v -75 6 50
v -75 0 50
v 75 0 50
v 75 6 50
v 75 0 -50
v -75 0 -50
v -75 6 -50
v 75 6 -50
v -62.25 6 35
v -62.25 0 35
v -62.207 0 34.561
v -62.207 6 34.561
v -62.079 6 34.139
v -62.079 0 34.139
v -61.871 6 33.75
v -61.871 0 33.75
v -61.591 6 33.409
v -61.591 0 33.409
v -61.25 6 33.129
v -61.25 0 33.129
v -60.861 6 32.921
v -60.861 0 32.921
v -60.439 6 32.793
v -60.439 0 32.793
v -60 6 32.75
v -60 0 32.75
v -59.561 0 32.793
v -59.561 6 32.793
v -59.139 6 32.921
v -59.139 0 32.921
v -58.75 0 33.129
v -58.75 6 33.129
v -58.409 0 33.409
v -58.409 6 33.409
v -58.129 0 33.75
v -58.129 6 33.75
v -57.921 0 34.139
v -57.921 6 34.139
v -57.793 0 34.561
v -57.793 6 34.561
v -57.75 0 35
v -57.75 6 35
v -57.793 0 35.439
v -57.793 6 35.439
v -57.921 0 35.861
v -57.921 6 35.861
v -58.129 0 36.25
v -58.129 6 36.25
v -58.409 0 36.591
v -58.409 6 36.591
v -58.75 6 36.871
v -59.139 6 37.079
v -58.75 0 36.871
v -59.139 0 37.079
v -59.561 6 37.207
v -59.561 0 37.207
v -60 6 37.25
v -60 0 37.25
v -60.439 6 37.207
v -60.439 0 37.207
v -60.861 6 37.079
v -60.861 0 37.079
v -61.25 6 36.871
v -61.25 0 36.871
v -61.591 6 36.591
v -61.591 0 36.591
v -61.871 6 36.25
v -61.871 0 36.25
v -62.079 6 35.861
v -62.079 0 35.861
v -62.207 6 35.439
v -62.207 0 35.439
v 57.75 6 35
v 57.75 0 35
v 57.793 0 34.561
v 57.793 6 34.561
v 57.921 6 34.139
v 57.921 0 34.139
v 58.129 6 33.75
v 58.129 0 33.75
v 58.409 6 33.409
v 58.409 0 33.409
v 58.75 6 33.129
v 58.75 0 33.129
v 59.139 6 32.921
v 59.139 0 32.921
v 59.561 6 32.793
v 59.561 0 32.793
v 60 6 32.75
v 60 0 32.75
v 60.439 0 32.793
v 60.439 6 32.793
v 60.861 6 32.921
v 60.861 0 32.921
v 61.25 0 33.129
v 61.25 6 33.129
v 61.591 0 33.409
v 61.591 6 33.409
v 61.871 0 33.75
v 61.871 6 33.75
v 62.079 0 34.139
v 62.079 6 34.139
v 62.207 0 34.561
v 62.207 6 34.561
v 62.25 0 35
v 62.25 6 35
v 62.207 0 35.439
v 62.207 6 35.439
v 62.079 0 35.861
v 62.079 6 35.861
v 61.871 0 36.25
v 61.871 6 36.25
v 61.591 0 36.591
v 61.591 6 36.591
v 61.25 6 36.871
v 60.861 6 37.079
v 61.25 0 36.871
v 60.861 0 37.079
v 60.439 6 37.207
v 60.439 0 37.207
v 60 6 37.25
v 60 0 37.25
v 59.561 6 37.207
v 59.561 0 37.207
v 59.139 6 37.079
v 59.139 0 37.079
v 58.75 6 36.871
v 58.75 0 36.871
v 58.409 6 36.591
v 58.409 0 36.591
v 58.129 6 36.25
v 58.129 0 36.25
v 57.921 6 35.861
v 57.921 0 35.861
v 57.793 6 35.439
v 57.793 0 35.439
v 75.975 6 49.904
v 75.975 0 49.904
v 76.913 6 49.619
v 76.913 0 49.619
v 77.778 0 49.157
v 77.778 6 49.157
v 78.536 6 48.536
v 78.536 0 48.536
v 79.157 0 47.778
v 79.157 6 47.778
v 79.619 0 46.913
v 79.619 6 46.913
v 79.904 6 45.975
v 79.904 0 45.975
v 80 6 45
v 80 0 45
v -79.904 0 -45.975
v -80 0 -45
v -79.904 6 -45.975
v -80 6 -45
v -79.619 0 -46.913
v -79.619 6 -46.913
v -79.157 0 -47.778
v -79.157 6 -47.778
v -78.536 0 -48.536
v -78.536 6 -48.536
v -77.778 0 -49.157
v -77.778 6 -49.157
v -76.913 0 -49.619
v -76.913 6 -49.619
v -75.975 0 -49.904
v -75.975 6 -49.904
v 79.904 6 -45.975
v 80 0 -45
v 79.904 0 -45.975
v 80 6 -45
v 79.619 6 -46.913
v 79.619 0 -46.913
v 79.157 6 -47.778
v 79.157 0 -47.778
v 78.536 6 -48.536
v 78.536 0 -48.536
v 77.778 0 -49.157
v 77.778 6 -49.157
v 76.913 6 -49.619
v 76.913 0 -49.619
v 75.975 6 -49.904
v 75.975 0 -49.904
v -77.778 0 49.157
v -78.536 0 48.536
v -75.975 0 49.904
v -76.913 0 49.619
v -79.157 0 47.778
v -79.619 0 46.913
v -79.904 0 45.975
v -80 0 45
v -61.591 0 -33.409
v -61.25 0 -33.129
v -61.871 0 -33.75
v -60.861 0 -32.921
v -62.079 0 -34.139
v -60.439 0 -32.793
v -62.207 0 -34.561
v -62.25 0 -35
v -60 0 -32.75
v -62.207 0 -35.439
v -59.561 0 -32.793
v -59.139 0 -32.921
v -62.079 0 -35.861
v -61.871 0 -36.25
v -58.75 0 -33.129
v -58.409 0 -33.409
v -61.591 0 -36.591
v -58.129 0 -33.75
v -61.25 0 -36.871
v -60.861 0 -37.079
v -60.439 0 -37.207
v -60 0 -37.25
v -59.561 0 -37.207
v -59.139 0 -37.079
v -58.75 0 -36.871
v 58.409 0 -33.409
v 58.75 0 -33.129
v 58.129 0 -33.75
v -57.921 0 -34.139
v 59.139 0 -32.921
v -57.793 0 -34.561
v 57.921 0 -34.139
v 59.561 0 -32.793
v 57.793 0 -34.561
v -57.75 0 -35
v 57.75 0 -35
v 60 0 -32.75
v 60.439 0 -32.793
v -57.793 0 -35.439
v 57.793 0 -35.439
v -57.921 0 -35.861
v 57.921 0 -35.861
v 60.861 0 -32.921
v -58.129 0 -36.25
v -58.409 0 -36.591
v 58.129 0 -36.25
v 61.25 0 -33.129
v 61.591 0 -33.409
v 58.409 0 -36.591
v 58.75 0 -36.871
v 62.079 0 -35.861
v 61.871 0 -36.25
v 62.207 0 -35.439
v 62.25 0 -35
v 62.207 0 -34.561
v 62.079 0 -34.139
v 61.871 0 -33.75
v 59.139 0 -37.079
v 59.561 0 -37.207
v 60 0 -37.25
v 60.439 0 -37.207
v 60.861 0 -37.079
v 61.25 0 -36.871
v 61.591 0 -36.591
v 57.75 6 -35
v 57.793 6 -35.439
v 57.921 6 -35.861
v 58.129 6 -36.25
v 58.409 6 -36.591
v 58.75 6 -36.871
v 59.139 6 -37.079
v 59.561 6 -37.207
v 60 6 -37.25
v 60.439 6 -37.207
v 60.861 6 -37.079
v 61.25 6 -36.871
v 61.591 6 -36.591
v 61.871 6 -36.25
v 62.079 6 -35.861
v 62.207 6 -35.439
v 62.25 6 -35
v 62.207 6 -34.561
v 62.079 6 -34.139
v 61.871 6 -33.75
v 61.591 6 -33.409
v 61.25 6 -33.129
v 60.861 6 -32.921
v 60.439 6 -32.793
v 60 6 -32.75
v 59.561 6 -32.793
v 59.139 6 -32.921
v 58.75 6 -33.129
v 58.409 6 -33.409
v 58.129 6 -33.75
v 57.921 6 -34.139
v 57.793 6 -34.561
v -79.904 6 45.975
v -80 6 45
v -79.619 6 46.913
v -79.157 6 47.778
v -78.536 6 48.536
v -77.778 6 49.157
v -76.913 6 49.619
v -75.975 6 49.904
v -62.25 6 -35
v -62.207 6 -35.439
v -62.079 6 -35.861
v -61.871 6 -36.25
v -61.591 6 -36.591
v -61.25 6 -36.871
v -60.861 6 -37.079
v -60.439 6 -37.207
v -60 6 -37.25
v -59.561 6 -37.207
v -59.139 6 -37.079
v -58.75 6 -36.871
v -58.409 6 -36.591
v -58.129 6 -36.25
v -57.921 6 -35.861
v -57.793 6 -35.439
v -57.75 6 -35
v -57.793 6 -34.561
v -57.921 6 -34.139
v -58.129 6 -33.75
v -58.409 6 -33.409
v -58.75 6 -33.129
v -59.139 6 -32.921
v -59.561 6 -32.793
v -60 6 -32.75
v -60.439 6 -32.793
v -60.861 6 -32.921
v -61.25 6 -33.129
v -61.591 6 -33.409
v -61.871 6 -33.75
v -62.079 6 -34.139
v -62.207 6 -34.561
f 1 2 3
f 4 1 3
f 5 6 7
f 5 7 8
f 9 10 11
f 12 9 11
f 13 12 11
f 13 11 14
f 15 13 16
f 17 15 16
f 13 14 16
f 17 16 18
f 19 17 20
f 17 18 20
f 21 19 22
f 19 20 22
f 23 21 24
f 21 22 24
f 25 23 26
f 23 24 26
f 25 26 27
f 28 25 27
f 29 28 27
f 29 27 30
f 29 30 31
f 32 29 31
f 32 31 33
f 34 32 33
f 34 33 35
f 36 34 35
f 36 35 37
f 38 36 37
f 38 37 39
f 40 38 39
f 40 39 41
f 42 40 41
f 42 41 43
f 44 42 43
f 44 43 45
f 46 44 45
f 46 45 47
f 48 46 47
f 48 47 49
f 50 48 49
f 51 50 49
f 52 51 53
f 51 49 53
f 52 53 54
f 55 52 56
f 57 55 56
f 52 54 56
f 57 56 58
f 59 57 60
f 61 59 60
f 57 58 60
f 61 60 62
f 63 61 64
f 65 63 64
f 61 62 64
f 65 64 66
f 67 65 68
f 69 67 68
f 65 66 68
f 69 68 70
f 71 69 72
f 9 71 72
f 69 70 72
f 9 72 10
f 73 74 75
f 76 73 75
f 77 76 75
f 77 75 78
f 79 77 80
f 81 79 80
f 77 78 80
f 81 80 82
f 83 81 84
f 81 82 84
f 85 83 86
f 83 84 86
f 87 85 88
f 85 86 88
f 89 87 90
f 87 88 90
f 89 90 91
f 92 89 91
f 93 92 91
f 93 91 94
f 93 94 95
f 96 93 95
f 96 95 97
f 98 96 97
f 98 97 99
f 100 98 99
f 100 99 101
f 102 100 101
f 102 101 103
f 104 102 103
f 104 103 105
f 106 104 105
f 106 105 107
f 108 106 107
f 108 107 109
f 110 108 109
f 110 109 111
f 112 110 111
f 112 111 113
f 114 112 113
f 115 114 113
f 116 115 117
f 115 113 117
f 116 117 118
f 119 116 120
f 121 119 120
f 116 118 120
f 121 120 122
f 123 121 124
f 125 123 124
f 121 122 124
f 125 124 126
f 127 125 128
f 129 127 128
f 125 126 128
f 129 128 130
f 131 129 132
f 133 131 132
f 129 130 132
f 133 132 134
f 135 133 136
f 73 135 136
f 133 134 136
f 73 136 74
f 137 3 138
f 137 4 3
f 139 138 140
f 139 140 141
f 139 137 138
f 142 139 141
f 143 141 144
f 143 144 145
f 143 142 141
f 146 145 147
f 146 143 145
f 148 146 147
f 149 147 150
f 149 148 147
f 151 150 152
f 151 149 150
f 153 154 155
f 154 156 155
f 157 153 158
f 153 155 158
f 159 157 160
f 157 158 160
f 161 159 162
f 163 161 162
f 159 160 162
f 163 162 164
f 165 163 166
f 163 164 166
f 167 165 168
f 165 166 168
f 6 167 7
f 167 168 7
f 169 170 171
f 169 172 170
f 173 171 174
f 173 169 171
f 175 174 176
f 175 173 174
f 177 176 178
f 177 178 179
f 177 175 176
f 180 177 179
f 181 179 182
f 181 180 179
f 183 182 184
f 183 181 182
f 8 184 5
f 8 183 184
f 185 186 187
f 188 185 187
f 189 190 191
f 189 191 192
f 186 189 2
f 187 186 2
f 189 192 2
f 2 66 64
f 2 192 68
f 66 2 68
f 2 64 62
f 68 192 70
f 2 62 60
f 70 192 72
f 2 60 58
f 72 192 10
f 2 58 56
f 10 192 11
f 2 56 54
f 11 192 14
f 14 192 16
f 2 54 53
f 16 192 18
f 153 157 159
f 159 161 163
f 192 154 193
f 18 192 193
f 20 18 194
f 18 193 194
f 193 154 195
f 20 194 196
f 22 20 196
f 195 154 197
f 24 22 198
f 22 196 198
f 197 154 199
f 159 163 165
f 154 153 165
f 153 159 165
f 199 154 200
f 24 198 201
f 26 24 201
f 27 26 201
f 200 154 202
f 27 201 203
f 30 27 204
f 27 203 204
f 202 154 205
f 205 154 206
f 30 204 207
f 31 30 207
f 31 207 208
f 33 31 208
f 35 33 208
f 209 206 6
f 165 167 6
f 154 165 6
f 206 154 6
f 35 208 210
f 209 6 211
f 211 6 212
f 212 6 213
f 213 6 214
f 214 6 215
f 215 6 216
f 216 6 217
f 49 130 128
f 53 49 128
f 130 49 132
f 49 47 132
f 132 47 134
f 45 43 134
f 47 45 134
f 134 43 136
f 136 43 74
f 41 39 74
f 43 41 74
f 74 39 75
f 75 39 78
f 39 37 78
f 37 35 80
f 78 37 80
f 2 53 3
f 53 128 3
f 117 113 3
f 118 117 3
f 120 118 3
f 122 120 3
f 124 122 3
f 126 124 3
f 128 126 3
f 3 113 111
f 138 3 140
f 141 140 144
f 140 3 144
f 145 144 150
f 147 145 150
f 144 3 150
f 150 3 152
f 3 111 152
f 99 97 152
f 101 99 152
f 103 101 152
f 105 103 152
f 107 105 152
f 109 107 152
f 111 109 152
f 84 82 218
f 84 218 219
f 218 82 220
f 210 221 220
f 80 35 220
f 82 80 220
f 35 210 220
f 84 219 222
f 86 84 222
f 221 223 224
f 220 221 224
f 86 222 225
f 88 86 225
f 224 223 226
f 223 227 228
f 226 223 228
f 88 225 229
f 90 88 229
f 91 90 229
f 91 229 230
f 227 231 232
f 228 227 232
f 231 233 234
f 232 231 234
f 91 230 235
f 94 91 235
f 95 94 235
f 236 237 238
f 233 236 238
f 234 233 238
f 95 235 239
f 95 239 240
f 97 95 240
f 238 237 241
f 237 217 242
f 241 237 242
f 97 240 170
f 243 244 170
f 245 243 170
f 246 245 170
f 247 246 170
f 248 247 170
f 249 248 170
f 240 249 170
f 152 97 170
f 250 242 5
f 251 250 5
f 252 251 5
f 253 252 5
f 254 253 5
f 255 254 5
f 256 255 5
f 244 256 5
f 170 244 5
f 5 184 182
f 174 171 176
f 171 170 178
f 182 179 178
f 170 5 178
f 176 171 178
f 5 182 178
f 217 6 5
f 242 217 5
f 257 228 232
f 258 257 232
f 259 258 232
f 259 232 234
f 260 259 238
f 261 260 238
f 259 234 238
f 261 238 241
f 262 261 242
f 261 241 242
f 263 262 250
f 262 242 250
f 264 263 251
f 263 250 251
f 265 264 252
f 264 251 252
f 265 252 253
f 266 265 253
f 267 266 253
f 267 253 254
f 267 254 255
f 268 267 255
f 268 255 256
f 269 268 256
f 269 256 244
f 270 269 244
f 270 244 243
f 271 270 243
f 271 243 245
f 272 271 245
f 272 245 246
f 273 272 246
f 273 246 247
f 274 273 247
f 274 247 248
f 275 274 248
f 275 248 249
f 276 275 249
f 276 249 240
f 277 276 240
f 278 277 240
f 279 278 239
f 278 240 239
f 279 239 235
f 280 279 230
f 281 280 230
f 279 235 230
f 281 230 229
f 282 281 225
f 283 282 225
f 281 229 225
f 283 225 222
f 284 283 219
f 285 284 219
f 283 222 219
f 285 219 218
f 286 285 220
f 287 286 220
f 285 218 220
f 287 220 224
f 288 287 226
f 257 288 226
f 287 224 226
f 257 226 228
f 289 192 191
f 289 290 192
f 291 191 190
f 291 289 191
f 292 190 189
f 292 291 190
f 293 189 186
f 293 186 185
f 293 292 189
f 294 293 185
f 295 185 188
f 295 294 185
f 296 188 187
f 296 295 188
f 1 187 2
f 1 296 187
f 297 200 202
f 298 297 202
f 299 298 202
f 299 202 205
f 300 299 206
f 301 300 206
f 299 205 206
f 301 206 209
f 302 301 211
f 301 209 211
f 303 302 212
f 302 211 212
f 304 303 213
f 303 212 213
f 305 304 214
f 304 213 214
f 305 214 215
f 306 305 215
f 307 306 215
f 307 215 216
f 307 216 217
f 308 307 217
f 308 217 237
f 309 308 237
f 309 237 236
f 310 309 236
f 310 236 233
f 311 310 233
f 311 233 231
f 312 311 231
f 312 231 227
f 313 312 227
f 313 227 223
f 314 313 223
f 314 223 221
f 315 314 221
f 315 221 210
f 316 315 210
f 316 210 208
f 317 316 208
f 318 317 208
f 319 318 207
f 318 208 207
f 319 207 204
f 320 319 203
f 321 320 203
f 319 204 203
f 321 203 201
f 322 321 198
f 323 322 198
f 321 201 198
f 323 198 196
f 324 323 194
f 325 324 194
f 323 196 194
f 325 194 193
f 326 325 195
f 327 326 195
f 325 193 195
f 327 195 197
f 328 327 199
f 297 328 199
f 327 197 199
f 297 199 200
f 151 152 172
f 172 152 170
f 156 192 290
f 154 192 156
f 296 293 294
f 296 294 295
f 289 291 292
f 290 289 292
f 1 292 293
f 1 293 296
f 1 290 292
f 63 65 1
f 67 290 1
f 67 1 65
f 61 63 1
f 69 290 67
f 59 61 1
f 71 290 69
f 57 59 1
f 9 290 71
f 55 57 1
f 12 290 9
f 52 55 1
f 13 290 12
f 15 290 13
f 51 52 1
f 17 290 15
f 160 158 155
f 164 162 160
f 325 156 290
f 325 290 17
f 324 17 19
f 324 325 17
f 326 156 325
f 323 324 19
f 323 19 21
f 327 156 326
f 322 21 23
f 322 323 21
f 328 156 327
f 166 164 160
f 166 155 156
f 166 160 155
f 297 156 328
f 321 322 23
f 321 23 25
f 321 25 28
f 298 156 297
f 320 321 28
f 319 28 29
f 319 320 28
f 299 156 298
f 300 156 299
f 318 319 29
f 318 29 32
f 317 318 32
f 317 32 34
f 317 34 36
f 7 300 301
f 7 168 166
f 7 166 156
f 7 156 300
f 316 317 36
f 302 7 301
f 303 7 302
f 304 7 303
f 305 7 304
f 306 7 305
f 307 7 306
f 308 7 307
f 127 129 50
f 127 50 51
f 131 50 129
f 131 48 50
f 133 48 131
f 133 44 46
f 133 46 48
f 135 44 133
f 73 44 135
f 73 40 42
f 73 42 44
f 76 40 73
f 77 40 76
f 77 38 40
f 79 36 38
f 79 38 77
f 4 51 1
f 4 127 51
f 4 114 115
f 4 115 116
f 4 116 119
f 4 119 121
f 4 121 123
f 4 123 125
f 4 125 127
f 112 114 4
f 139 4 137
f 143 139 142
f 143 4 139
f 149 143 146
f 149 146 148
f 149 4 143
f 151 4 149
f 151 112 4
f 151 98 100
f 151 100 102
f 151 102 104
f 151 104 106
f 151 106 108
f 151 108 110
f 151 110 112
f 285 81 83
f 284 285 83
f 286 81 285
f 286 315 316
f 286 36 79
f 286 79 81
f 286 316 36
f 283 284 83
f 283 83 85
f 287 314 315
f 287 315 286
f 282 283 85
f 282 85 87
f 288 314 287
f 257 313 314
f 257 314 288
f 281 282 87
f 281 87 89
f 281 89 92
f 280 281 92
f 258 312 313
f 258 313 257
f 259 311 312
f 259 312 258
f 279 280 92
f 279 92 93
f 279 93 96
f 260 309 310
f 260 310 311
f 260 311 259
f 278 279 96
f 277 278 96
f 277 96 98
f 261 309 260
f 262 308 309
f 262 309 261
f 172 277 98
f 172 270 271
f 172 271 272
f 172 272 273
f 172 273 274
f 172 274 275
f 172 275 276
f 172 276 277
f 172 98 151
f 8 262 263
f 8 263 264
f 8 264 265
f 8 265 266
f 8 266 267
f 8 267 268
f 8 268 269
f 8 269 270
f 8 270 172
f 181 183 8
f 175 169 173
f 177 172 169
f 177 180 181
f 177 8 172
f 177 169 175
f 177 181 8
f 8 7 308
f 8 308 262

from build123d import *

# Parameters (mm, degrees)
SKETCH1_W                     = 160
SKETCH1_H                     = 100
BASEPLATE_160X100X6_DEPTH     = 6
CORNER_FILLET_R5_R            = 5
M4_ISOLATOR_CLEARANCE_HOLES_D = 4.5


with BuildPart() as part:
    # Sketch1 → BasePlate_160x100x6 (new body)
    with BuildSketch(Plane(origin=(0, 0, 0), x_dir=(1, 0, 0), z_dir=(0, 1, 0))):
        Rectangle(SKETCH1_W, SKETCH1_H)
    extrude(amount=BASEPLATE_160X100X6_DEPTH)

    # Corner_Fillet_R5
    corner_fillet_r5_edges = [part.edges().sort_by_distance(p)[0] for p in [
        (-80, 3, -50),
        (80, 3, -50),
        (80, 3, 50),
        (-80, 3, 50),
    ]]
    fillet(corner_fillet_r5_edges, radius=CORNER_FILLET_R5_R)

    # M4_Isolator_Clearance_Holes (through all)
    with Locations(Plane(origin=(0, 6, 0), x_dir=(1, 0, 0), z_dir=(0, 1, 0))):
        with Locations((-60, 35), (60, 35), (60, -35), (-60, -35)):
            Hole(M4_ISOLATOR_CLEARANCE_HOLES_D / 2)


solid = part.part
